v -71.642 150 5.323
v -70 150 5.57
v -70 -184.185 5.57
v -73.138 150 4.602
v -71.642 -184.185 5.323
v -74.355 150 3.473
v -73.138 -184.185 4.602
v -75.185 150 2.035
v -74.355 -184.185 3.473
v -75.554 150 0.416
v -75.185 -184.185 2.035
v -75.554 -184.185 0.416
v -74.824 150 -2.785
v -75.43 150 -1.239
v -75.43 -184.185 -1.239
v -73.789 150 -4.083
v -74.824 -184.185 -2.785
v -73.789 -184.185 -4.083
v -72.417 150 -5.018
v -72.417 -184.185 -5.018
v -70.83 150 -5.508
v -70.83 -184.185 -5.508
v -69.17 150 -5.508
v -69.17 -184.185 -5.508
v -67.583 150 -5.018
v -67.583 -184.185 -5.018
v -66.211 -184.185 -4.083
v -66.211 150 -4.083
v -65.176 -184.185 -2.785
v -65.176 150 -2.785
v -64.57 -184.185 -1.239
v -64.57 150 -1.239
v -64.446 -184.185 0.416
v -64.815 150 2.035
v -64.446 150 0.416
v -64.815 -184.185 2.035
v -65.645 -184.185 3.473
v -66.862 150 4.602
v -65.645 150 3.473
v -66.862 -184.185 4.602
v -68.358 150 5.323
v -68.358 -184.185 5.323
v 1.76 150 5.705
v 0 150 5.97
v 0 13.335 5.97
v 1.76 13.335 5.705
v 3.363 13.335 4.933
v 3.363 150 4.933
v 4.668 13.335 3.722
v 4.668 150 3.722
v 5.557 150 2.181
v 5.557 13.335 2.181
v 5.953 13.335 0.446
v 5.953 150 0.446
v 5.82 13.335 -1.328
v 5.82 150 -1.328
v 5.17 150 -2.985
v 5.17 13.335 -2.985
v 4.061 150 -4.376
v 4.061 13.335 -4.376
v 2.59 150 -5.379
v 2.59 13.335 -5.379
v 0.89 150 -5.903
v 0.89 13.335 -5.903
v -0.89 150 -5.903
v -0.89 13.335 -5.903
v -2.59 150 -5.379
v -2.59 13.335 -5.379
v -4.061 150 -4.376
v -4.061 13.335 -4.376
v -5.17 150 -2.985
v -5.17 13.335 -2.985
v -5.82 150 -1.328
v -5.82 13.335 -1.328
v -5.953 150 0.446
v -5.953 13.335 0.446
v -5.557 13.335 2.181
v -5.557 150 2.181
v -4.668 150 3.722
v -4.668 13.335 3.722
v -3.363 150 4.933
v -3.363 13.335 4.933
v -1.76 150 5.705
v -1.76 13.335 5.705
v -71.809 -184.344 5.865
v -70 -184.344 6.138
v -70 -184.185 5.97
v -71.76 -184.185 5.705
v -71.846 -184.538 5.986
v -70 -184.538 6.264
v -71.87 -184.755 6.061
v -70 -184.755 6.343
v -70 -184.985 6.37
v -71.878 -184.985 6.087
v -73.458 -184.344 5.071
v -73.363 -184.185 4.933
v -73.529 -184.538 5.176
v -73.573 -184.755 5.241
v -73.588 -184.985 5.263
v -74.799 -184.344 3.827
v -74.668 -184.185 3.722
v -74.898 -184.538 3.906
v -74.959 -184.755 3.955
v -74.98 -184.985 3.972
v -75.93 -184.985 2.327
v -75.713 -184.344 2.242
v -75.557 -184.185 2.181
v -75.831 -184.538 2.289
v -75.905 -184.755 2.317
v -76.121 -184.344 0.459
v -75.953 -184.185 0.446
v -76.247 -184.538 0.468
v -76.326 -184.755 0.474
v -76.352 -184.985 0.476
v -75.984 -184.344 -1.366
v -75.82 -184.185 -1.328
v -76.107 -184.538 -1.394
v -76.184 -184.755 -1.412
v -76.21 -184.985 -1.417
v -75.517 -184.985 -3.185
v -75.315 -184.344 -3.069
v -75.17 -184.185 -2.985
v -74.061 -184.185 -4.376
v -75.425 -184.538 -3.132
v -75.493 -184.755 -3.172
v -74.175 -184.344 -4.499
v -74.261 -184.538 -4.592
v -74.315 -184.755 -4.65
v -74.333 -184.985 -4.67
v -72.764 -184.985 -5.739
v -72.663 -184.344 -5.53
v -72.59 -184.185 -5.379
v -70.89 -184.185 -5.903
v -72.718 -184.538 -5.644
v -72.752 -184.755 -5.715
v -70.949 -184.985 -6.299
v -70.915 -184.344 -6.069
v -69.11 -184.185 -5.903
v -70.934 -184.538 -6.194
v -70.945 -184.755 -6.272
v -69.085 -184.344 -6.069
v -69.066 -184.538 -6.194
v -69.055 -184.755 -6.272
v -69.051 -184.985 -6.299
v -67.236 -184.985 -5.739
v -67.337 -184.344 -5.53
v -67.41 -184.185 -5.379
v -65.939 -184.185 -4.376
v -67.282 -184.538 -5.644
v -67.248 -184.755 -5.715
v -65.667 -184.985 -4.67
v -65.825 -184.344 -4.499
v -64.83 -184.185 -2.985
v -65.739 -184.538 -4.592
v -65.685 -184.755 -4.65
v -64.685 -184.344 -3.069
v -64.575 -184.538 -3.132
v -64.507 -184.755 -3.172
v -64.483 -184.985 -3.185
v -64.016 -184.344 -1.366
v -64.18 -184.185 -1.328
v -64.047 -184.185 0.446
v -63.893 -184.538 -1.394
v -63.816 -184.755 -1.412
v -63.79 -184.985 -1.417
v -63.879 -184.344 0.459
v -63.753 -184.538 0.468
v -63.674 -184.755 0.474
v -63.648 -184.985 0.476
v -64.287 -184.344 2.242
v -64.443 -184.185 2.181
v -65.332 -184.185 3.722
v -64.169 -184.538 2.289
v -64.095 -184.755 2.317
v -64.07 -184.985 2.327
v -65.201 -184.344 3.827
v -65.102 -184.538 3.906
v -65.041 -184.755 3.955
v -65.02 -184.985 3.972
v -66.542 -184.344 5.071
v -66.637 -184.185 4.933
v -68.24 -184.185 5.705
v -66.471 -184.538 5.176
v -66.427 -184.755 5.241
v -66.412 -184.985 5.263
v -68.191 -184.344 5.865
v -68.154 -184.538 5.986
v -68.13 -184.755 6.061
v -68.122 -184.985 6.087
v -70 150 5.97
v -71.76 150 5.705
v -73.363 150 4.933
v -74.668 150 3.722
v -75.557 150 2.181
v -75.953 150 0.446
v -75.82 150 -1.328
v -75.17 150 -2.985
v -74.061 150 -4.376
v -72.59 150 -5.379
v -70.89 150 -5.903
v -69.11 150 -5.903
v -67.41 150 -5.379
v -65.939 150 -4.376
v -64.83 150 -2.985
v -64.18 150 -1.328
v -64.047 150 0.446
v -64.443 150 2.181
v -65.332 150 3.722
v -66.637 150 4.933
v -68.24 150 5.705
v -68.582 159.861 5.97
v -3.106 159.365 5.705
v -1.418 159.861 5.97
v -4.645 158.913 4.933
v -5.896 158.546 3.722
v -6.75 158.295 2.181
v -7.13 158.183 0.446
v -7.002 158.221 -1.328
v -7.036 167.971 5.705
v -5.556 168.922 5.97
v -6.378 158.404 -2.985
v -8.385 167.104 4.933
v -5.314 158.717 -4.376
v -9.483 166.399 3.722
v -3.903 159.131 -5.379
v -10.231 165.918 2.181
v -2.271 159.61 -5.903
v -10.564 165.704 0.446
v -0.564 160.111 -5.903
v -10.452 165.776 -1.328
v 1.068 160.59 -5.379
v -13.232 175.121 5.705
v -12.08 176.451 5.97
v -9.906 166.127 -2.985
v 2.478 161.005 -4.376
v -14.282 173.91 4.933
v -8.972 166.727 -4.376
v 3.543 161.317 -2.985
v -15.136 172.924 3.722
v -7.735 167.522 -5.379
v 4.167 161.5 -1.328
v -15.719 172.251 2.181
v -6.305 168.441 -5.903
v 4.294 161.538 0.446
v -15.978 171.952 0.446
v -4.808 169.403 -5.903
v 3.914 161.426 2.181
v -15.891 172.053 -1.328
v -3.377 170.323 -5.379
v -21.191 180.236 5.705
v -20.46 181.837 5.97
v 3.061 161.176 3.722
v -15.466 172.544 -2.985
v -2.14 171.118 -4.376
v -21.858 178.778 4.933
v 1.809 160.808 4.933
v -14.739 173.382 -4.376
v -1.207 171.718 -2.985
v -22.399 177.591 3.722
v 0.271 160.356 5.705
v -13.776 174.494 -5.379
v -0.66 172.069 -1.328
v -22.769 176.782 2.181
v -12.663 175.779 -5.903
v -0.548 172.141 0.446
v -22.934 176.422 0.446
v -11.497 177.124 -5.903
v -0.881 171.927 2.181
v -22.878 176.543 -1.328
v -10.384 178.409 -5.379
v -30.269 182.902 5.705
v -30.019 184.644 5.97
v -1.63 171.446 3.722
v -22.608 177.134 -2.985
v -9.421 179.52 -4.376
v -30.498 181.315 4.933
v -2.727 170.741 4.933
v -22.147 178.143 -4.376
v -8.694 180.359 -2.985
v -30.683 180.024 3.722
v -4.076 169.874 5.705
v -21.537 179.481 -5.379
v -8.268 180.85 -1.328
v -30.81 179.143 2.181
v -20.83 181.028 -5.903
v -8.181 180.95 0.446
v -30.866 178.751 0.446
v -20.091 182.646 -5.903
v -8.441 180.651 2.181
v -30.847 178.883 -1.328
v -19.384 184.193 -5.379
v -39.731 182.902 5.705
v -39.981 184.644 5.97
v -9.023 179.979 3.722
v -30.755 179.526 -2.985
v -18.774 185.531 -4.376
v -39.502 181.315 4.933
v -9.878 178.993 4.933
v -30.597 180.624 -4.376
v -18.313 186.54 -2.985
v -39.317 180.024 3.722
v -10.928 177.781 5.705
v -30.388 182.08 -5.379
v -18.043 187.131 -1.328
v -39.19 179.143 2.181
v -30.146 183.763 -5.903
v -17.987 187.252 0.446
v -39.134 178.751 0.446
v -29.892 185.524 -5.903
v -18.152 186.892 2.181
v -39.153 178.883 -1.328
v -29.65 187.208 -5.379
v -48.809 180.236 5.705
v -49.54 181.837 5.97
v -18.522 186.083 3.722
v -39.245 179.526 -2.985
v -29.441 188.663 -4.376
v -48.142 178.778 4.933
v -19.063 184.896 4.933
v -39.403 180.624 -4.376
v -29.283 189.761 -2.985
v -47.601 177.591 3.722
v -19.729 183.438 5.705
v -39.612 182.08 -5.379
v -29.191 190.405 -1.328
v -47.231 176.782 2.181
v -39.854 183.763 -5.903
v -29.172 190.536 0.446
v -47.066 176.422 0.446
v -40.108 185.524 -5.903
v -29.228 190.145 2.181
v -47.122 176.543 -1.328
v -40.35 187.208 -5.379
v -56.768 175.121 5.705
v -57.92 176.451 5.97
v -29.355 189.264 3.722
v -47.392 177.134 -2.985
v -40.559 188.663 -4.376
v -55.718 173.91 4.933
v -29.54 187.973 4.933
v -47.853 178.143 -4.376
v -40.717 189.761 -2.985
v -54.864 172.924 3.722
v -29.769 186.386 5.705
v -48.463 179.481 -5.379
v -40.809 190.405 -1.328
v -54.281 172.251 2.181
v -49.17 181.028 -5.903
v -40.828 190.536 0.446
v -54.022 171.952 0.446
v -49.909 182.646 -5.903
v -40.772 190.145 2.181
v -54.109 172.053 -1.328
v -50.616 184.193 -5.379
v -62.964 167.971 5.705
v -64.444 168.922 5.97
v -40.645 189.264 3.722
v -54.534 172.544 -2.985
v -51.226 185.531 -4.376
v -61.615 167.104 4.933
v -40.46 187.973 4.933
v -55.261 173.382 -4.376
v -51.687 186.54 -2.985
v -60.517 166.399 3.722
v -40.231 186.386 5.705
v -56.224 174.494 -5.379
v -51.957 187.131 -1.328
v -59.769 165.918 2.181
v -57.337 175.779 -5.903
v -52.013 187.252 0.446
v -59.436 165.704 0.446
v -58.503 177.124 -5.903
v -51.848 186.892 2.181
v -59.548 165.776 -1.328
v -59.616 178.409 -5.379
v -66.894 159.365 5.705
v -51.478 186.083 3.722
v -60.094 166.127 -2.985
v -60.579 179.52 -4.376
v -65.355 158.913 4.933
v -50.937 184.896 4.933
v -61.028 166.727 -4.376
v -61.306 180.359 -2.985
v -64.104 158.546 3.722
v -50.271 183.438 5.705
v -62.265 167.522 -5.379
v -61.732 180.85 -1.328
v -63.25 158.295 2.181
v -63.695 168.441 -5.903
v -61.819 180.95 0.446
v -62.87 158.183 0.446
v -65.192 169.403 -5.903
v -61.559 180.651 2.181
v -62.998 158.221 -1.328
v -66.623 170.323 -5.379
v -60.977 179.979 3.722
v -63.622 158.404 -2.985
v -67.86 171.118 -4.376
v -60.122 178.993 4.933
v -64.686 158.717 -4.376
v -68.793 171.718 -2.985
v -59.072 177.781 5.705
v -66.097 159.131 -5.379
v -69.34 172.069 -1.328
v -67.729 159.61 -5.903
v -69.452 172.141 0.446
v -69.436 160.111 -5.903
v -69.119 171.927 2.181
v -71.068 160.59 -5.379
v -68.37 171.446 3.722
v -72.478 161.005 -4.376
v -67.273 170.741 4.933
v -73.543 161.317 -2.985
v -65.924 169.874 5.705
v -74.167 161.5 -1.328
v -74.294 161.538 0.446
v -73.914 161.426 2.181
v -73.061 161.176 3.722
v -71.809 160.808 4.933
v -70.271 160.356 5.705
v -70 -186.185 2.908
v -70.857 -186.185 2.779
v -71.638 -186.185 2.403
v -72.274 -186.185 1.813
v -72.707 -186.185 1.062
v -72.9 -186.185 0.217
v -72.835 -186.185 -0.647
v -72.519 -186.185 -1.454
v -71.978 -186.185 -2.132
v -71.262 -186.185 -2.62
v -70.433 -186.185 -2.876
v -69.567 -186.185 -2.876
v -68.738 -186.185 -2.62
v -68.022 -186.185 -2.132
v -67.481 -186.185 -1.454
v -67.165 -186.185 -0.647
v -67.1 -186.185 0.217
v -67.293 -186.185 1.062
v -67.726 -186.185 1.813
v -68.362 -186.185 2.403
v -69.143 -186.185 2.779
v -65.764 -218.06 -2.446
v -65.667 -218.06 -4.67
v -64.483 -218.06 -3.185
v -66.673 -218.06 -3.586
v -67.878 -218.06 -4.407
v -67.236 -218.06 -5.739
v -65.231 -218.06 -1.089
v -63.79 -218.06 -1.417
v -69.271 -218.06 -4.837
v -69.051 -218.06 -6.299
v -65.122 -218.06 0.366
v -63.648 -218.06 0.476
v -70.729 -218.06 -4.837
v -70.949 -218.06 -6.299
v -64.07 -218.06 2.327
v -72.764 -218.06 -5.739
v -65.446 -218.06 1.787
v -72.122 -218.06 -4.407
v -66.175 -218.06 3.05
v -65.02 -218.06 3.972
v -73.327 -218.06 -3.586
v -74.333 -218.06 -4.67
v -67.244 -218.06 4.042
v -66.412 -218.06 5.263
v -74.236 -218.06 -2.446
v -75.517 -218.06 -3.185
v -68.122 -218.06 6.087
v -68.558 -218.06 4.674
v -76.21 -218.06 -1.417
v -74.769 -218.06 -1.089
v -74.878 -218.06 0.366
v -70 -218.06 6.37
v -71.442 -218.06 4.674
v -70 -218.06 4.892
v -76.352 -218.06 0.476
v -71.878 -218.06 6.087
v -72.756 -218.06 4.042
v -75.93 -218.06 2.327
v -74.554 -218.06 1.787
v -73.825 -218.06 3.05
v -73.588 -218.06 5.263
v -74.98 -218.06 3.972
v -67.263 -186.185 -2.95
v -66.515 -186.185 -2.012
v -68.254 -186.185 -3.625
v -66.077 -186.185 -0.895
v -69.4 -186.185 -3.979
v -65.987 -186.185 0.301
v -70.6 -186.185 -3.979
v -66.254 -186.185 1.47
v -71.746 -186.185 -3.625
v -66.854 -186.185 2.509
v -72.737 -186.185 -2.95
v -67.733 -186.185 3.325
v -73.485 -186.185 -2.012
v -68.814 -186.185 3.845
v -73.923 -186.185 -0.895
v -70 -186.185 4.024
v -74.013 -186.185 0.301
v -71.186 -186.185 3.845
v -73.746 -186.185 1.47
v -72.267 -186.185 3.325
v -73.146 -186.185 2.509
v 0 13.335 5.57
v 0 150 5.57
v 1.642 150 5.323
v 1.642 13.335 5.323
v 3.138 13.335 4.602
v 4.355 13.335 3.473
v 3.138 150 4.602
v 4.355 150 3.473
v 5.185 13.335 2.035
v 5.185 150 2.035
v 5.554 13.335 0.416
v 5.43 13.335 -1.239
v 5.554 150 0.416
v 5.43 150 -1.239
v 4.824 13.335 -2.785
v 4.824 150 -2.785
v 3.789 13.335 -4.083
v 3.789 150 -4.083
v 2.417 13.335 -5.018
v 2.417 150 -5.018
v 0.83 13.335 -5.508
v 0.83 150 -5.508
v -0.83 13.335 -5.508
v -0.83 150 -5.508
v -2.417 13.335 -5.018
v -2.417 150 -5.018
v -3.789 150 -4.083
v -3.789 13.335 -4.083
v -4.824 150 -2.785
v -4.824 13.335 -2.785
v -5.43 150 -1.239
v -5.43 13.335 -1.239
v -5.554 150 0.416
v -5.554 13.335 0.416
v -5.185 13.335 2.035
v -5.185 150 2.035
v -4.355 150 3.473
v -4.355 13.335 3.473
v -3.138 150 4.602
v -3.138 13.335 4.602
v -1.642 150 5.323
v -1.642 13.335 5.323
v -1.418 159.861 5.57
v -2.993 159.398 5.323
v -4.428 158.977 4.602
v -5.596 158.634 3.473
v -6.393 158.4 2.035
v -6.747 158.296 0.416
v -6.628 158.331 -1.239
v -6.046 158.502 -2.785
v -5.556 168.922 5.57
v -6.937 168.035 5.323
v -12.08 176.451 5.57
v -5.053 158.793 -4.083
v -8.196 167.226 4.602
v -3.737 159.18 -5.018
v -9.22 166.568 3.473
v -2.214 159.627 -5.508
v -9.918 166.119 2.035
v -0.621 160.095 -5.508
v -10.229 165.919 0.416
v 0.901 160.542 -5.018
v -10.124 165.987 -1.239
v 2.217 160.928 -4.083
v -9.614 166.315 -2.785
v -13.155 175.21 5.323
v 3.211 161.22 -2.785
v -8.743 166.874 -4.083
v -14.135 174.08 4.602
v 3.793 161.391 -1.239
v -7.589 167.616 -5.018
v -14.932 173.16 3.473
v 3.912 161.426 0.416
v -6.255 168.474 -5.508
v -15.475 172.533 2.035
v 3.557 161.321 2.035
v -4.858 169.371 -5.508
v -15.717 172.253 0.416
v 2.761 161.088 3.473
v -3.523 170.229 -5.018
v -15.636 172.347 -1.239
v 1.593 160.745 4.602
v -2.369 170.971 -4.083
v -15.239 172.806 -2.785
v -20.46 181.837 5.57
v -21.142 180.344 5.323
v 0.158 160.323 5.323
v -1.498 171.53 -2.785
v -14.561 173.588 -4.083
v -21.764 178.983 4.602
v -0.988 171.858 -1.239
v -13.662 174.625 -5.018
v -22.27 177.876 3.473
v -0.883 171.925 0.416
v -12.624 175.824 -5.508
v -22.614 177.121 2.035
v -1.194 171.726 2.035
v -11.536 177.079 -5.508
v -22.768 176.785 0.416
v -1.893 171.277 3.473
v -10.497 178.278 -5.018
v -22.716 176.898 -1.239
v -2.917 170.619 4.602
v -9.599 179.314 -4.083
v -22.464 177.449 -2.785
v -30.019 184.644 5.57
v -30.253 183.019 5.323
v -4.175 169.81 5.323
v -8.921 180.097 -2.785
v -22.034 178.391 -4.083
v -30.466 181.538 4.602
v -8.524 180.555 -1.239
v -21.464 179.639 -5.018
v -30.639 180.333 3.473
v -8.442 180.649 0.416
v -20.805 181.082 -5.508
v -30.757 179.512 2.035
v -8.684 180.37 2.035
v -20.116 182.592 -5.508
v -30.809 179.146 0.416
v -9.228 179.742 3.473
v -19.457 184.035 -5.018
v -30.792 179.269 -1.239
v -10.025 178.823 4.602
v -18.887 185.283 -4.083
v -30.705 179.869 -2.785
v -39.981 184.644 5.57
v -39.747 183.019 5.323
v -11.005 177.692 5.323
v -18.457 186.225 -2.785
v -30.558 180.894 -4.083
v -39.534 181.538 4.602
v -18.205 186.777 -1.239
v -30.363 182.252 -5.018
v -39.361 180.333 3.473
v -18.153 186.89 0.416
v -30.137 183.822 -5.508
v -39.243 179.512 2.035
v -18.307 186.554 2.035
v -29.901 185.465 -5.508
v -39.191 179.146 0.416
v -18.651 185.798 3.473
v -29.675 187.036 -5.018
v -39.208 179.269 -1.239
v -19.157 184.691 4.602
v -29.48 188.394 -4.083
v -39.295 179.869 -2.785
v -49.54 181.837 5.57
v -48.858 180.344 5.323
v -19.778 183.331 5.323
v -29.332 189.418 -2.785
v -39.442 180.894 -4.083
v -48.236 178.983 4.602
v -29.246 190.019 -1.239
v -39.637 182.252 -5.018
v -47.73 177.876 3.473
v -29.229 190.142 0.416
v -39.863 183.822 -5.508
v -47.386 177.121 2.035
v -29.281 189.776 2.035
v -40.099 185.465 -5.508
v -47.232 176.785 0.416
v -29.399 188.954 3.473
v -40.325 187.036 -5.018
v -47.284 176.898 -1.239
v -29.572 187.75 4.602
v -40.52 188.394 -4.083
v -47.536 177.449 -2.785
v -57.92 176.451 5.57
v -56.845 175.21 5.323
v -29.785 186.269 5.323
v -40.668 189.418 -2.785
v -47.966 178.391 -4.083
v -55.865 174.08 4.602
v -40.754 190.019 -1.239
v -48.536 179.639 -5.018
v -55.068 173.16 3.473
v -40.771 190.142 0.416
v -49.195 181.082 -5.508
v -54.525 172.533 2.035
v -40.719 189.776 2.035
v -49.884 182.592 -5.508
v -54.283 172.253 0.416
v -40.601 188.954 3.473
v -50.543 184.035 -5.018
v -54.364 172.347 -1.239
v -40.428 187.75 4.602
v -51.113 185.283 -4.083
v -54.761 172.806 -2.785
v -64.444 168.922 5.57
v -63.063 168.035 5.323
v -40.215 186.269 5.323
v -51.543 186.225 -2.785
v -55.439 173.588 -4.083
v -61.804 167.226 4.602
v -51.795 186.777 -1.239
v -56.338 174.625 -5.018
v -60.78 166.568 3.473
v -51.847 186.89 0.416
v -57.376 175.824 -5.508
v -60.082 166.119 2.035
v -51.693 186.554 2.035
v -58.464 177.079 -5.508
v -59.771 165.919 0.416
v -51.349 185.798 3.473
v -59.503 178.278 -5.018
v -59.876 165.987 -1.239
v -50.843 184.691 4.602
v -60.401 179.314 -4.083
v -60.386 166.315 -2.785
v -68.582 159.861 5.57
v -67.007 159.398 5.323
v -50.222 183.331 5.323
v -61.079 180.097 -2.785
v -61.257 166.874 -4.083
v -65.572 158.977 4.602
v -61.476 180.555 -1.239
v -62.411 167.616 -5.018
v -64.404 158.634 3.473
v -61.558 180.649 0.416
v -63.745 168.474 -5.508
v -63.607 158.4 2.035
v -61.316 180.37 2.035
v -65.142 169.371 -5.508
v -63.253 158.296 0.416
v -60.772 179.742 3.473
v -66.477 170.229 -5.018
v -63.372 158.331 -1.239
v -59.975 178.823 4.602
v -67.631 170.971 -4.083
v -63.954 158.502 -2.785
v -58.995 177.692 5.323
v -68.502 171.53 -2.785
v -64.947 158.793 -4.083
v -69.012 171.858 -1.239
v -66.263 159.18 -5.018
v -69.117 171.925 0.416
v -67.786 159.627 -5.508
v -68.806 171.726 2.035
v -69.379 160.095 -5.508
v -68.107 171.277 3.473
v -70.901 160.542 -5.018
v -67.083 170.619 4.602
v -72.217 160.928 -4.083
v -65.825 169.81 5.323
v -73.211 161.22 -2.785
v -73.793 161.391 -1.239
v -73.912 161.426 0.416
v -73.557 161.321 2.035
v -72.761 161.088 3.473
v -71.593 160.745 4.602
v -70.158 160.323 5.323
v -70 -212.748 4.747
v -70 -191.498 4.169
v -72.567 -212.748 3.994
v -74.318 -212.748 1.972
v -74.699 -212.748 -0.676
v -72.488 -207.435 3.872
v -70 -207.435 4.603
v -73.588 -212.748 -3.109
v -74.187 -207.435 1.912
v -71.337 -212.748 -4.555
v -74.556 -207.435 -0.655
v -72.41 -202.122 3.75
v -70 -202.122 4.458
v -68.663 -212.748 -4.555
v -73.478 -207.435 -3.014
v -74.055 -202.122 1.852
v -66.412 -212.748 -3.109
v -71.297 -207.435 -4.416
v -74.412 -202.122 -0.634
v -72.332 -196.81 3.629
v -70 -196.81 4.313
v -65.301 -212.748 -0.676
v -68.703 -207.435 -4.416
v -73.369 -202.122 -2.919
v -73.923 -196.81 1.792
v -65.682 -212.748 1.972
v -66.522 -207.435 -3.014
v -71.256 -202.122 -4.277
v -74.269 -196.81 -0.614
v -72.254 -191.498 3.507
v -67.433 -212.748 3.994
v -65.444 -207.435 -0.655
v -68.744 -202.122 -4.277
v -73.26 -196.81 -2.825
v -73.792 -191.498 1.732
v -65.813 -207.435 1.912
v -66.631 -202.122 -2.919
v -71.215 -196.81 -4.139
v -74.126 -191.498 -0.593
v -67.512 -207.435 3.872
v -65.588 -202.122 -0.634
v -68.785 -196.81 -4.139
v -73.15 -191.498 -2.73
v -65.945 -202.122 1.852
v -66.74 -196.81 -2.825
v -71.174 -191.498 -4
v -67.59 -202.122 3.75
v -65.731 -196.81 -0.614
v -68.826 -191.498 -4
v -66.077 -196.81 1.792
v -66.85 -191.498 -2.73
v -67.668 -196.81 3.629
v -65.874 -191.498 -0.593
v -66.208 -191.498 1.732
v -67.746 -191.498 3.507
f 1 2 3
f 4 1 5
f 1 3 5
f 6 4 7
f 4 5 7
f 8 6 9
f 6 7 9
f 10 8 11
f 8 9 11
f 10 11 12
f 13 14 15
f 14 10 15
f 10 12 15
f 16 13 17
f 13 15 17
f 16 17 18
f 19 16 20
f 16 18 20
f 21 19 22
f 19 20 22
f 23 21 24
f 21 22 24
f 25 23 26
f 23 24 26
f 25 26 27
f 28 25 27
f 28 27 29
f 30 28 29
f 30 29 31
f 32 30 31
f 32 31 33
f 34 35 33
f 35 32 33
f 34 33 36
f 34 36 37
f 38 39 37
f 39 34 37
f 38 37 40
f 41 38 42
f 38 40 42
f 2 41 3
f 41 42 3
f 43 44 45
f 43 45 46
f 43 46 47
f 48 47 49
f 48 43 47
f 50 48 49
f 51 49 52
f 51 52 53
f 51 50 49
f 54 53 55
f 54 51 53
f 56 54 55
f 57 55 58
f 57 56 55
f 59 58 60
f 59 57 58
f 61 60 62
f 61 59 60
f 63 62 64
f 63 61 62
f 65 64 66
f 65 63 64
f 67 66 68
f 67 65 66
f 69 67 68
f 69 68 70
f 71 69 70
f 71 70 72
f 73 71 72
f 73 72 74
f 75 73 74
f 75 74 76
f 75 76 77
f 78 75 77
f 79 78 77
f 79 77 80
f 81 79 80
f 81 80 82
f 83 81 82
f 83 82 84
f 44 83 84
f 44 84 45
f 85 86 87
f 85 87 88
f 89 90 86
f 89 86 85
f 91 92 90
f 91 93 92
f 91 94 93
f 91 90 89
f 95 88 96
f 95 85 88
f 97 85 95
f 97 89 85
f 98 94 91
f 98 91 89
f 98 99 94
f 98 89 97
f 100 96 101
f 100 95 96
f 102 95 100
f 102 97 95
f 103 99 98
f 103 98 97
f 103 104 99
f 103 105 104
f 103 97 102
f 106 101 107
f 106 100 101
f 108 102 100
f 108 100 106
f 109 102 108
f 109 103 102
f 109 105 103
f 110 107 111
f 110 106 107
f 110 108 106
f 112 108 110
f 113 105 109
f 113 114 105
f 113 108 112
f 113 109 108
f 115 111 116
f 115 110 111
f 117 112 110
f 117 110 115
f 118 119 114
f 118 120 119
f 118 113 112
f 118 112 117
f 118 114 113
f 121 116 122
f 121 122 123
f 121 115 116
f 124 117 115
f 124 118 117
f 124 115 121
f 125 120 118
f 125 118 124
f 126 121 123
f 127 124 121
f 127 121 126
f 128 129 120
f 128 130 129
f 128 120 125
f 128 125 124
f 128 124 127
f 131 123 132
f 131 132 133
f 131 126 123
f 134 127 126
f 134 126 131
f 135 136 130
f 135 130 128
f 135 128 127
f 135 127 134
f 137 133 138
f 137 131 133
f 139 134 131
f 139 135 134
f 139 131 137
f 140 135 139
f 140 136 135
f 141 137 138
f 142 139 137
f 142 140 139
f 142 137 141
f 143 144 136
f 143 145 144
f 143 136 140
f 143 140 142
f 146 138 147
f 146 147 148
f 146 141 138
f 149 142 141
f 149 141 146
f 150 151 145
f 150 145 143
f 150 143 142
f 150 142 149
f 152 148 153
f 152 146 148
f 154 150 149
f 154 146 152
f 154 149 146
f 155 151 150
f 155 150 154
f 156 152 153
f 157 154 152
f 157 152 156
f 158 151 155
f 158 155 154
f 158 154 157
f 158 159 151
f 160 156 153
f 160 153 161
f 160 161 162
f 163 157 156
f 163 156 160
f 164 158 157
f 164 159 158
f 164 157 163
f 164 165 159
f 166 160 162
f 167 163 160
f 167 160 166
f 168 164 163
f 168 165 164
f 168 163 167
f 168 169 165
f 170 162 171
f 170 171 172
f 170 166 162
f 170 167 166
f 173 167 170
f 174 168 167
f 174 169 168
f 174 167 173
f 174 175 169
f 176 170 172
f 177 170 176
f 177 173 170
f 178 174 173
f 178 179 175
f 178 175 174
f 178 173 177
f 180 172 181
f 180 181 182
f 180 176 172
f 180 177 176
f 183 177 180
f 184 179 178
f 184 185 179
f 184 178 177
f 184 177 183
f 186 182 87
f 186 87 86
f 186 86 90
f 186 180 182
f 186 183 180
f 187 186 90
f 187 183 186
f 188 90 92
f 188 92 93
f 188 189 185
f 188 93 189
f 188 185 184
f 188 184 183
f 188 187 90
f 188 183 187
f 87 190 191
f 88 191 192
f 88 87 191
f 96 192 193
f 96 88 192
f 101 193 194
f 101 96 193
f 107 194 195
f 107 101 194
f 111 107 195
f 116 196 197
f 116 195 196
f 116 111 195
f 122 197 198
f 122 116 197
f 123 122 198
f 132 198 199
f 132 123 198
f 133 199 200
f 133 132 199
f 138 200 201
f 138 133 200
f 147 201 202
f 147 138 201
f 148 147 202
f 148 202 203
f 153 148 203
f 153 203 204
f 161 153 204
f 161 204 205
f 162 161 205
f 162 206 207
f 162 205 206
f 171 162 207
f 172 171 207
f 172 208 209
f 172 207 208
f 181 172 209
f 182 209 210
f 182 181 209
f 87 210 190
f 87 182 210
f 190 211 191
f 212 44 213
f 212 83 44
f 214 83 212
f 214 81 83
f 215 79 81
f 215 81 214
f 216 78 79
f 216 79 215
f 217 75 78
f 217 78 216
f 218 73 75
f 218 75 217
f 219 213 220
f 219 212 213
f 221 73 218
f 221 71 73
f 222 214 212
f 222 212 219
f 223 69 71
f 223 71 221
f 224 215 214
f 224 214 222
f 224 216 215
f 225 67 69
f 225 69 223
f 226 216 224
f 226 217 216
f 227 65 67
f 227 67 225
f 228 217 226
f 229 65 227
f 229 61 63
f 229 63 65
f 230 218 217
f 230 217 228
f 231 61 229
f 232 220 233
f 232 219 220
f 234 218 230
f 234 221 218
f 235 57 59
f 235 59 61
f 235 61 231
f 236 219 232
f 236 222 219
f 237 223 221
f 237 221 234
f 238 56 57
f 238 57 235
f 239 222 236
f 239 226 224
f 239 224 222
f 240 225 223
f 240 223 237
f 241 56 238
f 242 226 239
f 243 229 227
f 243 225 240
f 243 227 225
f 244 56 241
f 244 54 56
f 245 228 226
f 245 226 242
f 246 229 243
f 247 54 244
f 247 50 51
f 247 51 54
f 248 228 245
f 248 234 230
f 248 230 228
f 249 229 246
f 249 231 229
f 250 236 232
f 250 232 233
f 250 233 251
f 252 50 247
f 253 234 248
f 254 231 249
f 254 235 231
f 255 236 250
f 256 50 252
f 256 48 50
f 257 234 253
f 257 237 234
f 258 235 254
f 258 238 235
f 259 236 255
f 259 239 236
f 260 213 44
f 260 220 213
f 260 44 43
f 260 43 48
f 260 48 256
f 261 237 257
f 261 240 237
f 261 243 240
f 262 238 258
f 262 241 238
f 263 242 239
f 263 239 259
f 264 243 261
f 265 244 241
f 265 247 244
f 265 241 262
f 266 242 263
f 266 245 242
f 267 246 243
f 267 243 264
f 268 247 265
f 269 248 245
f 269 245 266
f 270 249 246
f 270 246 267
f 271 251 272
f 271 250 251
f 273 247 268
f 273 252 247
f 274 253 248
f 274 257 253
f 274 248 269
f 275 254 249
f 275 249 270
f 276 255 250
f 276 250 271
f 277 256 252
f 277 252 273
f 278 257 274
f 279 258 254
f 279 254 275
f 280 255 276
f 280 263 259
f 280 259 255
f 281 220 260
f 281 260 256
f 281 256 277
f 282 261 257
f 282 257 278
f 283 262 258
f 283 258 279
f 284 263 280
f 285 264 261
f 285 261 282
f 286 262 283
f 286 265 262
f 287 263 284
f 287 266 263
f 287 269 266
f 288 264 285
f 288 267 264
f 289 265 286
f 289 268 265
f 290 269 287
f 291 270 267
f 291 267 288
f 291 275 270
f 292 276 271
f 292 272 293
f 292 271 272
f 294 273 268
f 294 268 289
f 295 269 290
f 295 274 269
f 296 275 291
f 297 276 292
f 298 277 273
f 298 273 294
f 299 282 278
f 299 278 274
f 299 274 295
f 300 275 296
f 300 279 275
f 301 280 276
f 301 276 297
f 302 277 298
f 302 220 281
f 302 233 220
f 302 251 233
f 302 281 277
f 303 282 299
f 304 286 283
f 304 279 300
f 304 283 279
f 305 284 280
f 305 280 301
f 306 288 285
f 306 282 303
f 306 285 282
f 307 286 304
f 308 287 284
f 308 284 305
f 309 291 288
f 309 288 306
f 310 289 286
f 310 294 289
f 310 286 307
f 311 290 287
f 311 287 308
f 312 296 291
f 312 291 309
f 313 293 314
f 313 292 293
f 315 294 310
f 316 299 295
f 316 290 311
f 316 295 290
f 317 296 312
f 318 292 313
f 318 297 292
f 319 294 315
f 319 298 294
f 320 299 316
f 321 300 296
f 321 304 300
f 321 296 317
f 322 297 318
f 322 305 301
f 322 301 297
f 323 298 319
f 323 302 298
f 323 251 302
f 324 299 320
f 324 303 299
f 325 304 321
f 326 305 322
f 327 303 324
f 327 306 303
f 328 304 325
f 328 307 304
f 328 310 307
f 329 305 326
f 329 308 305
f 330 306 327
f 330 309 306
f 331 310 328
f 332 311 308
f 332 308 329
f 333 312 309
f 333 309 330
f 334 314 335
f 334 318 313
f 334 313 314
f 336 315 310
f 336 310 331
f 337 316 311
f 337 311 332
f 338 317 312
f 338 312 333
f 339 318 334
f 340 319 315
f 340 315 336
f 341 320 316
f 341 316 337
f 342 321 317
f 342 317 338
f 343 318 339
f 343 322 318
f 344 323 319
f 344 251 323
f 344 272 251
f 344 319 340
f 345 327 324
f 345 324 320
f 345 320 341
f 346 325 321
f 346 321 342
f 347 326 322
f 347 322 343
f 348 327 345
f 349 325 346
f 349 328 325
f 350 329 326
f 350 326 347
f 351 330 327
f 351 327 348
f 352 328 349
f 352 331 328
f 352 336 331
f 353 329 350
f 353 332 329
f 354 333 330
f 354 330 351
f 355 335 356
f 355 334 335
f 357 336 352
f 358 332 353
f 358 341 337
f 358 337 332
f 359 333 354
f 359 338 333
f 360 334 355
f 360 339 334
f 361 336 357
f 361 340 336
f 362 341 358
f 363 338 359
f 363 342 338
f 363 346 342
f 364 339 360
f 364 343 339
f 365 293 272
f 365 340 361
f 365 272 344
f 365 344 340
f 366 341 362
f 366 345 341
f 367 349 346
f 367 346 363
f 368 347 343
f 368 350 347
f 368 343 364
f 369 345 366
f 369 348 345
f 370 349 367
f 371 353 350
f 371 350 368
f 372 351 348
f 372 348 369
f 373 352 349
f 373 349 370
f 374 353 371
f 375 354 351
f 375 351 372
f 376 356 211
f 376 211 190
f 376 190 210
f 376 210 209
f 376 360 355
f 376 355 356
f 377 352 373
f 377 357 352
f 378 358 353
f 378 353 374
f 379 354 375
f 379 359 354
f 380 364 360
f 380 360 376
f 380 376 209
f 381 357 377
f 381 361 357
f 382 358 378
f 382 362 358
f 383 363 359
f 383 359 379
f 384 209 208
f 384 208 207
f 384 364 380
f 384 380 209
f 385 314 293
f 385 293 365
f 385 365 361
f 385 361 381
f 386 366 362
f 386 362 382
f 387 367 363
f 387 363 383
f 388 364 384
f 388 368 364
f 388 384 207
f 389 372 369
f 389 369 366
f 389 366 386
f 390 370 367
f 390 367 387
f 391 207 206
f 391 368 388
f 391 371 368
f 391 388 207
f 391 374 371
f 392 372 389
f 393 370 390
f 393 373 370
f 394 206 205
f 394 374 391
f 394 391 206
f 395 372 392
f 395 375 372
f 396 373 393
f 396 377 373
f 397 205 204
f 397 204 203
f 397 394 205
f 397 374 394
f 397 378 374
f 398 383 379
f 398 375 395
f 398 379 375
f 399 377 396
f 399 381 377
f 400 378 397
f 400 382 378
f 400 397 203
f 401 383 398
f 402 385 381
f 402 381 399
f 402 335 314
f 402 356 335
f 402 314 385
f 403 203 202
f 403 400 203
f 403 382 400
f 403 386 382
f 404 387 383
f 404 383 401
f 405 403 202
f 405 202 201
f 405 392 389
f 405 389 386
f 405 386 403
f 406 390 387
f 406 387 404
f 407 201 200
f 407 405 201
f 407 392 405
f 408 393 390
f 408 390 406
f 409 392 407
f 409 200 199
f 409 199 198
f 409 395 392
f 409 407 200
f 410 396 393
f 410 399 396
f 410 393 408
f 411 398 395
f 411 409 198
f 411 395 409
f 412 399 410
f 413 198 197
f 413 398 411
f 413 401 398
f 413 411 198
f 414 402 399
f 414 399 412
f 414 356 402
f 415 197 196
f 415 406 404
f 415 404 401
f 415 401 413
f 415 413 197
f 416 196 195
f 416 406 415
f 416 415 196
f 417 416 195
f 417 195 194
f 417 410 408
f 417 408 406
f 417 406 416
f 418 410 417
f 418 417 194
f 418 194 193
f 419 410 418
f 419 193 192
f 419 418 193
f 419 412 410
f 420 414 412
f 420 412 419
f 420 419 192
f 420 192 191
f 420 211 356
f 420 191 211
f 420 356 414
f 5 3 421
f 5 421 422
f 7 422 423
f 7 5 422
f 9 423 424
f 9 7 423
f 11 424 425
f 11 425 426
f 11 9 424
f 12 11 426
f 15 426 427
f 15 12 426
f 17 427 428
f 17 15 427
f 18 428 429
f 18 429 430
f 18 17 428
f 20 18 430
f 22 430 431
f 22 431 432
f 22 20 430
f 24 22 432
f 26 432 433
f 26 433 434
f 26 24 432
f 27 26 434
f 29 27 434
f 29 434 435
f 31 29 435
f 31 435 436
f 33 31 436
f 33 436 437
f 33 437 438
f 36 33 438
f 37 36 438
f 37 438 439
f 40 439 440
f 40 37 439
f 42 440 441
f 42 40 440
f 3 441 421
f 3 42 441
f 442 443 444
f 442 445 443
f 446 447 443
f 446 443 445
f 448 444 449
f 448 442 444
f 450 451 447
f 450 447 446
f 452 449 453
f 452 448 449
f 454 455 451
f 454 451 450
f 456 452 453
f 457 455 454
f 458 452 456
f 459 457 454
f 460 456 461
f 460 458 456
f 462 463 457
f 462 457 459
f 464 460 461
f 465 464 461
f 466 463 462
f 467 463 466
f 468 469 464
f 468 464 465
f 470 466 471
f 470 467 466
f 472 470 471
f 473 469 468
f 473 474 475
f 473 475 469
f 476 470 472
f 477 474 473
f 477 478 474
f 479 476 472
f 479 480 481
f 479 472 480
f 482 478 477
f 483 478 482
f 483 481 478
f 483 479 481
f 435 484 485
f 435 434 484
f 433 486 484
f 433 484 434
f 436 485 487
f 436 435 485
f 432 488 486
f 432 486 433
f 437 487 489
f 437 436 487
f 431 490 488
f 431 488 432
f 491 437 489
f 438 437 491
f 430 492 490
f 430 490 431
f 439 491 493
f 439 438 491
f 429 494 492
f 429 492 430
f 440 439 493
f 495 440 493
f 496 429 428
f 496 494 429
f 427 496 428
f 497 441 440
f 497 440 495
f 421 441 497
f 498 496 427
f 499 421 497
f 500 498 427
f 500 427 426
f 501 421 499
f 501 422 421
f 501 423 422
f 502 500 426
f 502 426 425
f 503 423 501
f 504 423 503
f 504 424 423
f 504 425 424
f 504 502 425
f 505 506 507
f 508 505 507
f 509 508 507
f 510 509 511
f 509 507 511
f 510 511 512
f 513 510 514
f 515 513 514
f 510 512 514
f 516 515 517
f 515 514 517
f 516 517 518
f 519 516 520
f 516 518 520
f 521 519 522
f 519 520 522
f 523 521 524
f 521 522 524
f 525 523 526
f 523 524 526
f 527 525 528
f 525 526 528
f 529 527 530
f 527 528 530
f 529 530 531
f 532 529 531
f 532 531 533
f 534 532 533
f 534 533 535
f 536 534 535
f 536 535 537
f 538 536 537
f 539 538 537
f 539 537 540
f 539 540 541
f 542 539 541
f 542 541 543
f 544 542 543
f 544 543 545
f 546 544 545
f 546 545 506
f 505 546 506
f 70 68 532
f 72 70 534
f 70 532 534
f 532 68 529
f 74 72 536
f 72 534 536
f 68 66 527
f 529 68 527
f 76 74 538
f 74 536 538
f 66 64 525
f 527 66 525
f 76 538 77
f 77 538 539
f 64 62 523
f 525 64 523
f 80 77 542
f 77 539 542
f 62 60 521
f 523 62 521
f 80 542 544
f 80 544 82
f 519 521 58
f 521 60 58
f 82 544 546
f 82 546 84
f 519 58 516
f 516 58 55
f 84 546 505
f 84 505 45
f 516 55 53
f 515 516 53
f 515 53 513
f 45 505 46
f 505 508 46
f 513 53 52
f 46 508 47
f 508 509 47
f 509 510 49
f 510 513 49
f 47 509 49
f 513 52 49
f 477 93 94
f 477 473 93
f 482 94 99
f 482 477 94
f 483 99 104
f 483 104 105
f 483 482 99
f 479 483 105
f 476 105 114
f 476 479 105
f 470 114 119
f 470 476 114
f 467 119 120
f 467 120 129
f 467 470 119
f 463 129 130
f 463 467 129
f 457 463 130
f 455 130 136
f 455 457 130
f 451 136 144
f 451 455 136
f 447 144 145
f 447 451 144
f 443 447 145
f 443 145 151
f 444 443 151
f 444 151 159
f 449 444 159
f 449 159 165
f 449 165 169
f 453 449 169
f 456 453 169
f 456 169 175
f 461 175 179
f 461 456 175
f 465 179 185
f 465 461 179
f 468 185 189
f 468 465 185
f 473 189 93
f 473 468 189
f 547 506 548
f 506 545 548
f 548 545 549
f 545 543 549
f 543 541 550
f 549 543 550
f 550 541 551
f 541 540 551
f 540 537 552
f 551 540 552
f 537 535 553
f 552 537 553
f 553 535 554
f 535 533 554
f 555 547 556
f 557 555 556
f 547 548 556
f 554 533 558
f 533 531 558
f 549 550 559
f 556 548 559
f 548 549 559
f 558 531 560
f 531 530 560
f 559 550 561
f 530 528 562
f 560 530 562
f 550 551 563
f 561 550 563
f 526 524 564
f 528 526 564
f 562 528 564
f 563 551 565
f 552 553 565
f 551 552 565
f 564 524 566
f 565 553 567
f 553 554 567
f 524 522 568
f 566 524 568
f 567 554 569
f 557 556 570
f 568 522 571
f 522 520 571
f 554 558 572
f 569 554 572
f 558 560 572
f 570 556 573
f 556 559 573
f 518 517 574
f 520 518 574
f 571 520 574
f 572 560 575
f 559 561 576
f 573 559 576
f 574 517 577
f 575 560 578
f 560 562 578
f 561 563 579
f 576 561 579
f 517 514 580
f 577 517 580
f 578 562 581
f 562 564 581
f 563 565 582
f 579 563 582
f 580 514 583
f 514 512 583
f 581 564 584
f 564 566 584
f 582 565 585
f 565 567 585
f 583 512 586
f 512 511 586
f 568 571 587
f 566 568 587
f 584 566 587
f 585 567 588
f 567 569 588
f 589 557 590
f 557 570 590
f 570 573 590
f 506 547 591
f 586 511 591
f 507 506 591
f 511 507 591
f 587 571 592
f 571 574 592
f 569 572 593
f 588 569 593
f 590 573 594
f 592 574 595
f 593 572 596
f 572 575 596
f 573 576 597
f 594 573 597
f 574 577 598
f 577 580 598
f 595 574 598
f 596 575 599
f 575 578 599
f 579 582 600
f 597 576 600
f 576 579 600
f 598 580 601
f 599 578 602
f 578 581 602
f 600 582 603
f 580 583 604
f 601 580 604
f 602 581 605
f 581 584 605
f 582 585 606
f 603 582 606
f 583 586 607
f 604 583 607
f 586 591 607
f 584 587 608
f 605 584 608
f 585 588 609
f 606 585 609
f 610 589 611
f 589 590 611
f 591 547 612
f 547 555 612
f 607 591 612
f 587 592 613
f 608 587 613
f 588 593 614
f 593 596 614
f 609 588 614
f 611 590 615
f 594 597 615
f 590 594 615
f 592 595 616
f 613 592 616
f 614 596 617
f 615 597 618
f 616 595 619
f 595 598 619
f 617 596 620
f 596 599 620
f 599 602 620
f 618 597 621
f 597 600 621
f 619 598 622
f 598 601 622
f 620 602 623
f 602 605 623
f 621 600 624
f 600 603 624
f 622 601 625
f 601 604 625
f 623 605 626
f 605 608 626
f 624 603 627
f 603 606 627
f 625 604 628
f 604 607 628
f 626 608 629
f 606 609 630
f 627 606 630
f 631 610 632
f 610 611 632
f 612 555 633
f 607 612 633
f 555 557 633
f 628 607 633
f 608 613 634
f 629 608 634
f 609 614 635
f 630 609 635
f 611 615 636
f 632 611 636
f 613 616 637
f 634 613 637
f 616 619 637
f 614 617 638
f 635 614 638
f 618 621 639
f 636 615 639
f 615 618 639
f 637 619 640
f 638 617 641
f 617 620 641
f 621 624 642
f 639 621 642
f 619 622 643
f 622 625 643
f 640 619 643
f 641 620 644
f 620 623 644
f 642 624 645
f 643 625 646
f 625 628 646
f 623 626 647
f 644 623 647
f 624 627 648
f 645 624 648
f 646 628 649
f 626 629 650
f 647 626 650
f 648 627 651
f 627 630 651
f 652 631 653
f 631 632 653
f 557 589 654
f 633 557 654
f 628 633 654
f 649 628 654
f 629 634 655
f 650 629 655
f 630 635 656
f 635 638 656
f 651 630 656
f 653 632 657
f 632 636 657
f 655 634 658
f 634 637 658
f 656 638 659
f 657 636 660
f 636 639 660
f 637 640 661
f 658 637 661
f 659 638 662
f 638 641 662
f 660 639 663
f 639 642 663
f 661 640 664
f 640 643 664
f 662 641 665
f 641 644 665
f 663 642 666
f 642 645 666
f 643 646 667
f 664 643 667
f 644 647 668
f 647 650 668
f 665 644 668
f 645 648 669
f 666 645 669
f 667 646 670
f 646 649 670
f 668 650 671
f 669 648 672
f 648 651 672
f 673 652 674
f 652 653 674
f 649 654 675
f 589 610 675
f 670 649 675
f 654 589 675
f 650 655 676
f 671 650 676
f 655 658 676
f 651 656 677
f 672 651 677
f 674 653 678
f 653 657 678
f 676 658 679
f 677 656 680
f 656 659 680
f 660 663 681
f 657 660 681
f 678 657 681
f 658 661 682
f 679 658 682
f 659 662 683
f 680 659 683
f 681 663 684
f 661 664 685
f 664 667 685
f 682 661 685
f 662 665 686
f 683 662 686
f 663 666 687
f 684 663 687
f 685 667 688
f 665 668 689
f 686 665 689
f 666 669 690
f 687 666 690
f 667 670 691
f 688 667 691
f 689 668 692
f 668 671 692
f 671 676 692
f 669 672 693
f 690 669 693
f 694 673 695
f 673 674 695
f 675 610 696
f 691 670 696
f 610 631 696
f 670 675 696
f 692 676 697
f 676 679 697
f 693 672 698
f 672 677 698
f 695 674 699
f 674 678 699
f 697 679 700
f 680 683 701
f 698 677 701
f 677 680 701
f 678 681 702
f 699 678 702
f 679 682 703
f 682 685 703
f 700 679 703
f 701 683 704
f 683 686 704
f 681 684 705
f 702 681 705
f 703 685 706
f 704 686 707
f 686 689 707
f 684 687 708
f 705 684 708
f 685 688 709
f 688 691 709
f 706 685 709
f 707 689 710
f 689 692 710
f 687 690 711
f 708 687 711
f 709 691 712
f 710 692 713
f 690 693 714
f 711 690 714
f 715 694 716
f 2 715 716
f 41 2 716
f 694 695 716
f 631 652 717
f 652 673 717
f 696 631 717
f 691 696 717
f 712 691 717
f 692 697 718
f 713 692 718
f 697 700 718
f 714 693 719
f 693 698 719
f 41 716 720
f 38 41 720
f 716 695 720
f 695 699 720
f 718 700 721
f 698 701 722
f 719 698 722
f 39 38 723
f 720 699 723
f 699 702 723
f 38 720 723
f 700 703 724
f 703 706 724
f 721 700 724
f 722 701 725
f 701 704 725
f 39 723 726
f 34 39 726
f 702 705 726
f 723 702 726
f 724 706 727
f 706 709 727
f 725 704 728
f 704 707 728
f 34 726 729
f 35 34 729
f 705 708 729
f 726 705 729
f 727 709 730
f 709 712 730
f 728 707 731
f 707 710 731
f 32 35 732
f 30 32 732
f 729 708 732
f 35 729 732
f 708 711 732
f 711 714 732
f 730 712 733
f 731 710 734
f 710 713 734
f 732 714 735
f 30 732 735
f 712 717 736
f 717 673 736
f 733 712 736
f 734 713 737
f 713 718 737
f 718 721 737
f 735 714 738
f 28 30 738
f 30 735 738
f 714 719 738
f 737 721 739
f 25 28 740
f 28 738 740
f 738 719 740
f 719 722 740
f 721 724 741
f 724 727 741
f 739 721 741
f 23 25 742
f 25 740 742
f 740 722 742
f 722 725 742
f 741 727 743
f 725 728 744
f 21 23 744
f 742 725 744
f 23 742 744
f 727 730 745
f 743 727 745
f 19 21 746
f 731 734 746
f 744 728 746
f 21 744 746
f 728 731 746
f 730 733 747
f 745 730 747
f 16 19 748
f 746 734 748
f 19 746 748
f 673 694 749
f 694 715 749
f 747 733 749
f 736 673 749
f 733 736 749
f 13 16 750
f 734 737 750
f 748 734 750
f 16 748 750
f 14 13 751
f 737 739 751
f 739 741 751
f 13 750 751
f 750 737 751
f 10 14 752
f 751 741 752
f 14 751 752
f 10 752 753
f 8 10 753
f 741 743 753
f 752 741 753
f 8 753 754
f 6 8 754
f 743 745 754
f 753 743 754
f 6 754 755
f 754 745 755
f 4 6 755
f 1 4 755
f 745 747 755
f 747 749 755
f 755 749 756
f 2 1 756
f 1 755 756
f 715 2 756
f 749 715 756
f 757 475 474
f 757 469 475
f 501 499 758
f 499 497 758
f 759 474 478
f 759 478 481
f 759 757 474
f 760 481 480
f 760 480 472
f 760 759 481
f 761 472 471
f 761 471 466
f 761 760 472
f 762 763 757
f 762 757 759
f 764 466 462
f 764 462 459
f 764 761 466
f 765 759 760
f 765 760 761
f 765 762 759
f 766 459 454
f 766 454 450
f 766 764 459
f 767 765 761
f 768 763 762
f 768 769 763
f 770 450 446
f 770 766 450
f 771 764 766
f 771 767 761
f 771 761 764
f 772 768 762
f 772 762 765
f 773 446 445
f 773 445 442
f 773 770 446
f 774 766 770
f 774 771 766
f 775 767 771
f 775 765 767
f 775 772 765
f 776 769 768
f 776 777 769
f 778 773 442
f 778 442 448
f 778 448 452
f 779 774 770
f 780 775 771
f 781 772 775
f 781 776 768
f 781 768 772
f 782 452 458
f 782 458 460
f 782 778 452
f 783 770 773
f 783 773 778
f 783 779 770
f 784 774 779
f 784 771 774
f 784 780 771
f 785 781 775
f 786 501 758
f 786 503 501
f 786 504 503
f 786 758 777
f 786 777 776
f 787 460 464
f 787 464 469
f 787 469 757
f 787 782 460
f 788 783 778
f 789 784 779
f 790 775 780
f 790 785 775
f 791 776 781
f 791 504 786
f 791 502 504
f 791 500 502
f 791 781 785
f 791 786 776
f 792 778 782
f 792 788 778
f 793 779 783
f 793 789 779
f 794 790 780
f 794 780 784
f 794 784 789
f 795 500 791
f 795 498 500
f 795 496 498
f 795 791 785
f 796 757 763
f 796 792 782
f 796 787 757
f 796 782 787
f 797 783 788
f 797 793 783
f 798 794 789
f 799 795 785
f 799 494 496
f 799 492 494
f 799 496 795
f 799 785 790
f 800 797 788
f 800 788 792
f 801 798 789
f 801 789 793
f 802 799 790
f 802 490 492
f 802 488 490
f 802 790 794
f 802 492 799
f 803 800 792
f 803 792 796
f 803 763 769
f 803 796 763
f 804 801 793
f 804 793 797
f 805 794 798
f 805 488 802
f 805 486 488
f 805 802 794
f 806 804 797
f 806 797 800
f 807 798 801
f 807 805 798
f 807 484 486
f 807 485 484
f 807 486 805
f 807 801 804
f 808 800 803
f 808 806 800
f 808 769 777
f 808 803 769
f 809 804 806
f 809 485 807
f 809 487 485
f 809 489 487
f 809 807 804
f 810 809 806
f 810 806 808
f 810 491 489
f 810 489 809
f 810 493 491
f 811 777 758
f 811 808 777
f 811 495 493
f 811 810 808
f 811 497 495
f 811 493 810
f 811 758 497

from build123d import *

# Parameters (mm, degrees)
SWEEP_THIN1_PROFILE_R   = 5.97
SWEEP_THIN1_PROFILE_R_2 = 5.57
FILLET1_R               = 1


with BuildPart() as part:
    # Sweep-Thin1: sweep along a path in Sketch1
    with BuildLine(Plane(origin=(0, 0, 0), x_dir=(0, 1, 0), z_dir=(0, 0, 1))) as sweep_thin1_path:
        Line((13.335, 0), (150, 0))
        ThreePointArc((150, 0), (185, 35), (150, 70))
        Line((150, 70), (-184.185, 70))
    # Sweep-Thin1 profile (on start of the path) → Sweep-Thin1 (sweep)
    with BuildSketch(Plane.ZX.offset(13.335)):
        Circle(SWEEP_THIN1_PROFILE_R)
        Circle(SWEEP_THIN1_PROFILE_R_2, mode=Mode.SUBTRACT)
    sweep(path=sweep_thin1_path.line)

    # Sketch19 → Revolve2 (revolve)
    with BuildSketch(Plane(origin=(0, 0, 0), x_dir=(0, 1, 0), z_dir=(0, 0, 1)), mode=Mode.PRIVATE) as revolve2_sk:
        Polygon((-184.185, 76.37), (-218.06, 76.37), (-218.06, 74.891814615), (-186.185, 74.023934498), (-186.185, 72.908200054), (-184.185, 75.57), align=None)
    revolve(revolve2_sk.sketch.rotate(Axis((-70, -184.185, 0), (0, -1, 0)), 270), axis=Axis((-70, -184.185, 0), (0, -1, 0)))

    # Fillet1
    # the kernel refuses this fillet: 1 mm, written as the material it takes off along each edge
    with BuildSketch(Plane(origin=(-70, -184.185, 0), x_dir=(0, 0, 1), z_dir=(1, 0, 0))) as fillet1_piece_1:
        with BuildLine():
            CenterArc((5.37, 0.8), FILLET1_R, 306.869897646, 53.130102354)
            Line((6.37, 0.8), (6.39, 0.8))
            Line((6.39, 0.8), (6.39, 0))
            Line((6.39, 0), (6.37, -0.02))
            ThreePointArc((6.37, -0.02), (6.17, -0.02), (5.982, -0.016))
            Line((5.982, -0.016), (5.97, 0))
        make_face()
    revolve(axis=Axis((-70, -184.185, 0), (0, -1, 0)), mode=Mode.SUBTRACT)


solid = part.part
